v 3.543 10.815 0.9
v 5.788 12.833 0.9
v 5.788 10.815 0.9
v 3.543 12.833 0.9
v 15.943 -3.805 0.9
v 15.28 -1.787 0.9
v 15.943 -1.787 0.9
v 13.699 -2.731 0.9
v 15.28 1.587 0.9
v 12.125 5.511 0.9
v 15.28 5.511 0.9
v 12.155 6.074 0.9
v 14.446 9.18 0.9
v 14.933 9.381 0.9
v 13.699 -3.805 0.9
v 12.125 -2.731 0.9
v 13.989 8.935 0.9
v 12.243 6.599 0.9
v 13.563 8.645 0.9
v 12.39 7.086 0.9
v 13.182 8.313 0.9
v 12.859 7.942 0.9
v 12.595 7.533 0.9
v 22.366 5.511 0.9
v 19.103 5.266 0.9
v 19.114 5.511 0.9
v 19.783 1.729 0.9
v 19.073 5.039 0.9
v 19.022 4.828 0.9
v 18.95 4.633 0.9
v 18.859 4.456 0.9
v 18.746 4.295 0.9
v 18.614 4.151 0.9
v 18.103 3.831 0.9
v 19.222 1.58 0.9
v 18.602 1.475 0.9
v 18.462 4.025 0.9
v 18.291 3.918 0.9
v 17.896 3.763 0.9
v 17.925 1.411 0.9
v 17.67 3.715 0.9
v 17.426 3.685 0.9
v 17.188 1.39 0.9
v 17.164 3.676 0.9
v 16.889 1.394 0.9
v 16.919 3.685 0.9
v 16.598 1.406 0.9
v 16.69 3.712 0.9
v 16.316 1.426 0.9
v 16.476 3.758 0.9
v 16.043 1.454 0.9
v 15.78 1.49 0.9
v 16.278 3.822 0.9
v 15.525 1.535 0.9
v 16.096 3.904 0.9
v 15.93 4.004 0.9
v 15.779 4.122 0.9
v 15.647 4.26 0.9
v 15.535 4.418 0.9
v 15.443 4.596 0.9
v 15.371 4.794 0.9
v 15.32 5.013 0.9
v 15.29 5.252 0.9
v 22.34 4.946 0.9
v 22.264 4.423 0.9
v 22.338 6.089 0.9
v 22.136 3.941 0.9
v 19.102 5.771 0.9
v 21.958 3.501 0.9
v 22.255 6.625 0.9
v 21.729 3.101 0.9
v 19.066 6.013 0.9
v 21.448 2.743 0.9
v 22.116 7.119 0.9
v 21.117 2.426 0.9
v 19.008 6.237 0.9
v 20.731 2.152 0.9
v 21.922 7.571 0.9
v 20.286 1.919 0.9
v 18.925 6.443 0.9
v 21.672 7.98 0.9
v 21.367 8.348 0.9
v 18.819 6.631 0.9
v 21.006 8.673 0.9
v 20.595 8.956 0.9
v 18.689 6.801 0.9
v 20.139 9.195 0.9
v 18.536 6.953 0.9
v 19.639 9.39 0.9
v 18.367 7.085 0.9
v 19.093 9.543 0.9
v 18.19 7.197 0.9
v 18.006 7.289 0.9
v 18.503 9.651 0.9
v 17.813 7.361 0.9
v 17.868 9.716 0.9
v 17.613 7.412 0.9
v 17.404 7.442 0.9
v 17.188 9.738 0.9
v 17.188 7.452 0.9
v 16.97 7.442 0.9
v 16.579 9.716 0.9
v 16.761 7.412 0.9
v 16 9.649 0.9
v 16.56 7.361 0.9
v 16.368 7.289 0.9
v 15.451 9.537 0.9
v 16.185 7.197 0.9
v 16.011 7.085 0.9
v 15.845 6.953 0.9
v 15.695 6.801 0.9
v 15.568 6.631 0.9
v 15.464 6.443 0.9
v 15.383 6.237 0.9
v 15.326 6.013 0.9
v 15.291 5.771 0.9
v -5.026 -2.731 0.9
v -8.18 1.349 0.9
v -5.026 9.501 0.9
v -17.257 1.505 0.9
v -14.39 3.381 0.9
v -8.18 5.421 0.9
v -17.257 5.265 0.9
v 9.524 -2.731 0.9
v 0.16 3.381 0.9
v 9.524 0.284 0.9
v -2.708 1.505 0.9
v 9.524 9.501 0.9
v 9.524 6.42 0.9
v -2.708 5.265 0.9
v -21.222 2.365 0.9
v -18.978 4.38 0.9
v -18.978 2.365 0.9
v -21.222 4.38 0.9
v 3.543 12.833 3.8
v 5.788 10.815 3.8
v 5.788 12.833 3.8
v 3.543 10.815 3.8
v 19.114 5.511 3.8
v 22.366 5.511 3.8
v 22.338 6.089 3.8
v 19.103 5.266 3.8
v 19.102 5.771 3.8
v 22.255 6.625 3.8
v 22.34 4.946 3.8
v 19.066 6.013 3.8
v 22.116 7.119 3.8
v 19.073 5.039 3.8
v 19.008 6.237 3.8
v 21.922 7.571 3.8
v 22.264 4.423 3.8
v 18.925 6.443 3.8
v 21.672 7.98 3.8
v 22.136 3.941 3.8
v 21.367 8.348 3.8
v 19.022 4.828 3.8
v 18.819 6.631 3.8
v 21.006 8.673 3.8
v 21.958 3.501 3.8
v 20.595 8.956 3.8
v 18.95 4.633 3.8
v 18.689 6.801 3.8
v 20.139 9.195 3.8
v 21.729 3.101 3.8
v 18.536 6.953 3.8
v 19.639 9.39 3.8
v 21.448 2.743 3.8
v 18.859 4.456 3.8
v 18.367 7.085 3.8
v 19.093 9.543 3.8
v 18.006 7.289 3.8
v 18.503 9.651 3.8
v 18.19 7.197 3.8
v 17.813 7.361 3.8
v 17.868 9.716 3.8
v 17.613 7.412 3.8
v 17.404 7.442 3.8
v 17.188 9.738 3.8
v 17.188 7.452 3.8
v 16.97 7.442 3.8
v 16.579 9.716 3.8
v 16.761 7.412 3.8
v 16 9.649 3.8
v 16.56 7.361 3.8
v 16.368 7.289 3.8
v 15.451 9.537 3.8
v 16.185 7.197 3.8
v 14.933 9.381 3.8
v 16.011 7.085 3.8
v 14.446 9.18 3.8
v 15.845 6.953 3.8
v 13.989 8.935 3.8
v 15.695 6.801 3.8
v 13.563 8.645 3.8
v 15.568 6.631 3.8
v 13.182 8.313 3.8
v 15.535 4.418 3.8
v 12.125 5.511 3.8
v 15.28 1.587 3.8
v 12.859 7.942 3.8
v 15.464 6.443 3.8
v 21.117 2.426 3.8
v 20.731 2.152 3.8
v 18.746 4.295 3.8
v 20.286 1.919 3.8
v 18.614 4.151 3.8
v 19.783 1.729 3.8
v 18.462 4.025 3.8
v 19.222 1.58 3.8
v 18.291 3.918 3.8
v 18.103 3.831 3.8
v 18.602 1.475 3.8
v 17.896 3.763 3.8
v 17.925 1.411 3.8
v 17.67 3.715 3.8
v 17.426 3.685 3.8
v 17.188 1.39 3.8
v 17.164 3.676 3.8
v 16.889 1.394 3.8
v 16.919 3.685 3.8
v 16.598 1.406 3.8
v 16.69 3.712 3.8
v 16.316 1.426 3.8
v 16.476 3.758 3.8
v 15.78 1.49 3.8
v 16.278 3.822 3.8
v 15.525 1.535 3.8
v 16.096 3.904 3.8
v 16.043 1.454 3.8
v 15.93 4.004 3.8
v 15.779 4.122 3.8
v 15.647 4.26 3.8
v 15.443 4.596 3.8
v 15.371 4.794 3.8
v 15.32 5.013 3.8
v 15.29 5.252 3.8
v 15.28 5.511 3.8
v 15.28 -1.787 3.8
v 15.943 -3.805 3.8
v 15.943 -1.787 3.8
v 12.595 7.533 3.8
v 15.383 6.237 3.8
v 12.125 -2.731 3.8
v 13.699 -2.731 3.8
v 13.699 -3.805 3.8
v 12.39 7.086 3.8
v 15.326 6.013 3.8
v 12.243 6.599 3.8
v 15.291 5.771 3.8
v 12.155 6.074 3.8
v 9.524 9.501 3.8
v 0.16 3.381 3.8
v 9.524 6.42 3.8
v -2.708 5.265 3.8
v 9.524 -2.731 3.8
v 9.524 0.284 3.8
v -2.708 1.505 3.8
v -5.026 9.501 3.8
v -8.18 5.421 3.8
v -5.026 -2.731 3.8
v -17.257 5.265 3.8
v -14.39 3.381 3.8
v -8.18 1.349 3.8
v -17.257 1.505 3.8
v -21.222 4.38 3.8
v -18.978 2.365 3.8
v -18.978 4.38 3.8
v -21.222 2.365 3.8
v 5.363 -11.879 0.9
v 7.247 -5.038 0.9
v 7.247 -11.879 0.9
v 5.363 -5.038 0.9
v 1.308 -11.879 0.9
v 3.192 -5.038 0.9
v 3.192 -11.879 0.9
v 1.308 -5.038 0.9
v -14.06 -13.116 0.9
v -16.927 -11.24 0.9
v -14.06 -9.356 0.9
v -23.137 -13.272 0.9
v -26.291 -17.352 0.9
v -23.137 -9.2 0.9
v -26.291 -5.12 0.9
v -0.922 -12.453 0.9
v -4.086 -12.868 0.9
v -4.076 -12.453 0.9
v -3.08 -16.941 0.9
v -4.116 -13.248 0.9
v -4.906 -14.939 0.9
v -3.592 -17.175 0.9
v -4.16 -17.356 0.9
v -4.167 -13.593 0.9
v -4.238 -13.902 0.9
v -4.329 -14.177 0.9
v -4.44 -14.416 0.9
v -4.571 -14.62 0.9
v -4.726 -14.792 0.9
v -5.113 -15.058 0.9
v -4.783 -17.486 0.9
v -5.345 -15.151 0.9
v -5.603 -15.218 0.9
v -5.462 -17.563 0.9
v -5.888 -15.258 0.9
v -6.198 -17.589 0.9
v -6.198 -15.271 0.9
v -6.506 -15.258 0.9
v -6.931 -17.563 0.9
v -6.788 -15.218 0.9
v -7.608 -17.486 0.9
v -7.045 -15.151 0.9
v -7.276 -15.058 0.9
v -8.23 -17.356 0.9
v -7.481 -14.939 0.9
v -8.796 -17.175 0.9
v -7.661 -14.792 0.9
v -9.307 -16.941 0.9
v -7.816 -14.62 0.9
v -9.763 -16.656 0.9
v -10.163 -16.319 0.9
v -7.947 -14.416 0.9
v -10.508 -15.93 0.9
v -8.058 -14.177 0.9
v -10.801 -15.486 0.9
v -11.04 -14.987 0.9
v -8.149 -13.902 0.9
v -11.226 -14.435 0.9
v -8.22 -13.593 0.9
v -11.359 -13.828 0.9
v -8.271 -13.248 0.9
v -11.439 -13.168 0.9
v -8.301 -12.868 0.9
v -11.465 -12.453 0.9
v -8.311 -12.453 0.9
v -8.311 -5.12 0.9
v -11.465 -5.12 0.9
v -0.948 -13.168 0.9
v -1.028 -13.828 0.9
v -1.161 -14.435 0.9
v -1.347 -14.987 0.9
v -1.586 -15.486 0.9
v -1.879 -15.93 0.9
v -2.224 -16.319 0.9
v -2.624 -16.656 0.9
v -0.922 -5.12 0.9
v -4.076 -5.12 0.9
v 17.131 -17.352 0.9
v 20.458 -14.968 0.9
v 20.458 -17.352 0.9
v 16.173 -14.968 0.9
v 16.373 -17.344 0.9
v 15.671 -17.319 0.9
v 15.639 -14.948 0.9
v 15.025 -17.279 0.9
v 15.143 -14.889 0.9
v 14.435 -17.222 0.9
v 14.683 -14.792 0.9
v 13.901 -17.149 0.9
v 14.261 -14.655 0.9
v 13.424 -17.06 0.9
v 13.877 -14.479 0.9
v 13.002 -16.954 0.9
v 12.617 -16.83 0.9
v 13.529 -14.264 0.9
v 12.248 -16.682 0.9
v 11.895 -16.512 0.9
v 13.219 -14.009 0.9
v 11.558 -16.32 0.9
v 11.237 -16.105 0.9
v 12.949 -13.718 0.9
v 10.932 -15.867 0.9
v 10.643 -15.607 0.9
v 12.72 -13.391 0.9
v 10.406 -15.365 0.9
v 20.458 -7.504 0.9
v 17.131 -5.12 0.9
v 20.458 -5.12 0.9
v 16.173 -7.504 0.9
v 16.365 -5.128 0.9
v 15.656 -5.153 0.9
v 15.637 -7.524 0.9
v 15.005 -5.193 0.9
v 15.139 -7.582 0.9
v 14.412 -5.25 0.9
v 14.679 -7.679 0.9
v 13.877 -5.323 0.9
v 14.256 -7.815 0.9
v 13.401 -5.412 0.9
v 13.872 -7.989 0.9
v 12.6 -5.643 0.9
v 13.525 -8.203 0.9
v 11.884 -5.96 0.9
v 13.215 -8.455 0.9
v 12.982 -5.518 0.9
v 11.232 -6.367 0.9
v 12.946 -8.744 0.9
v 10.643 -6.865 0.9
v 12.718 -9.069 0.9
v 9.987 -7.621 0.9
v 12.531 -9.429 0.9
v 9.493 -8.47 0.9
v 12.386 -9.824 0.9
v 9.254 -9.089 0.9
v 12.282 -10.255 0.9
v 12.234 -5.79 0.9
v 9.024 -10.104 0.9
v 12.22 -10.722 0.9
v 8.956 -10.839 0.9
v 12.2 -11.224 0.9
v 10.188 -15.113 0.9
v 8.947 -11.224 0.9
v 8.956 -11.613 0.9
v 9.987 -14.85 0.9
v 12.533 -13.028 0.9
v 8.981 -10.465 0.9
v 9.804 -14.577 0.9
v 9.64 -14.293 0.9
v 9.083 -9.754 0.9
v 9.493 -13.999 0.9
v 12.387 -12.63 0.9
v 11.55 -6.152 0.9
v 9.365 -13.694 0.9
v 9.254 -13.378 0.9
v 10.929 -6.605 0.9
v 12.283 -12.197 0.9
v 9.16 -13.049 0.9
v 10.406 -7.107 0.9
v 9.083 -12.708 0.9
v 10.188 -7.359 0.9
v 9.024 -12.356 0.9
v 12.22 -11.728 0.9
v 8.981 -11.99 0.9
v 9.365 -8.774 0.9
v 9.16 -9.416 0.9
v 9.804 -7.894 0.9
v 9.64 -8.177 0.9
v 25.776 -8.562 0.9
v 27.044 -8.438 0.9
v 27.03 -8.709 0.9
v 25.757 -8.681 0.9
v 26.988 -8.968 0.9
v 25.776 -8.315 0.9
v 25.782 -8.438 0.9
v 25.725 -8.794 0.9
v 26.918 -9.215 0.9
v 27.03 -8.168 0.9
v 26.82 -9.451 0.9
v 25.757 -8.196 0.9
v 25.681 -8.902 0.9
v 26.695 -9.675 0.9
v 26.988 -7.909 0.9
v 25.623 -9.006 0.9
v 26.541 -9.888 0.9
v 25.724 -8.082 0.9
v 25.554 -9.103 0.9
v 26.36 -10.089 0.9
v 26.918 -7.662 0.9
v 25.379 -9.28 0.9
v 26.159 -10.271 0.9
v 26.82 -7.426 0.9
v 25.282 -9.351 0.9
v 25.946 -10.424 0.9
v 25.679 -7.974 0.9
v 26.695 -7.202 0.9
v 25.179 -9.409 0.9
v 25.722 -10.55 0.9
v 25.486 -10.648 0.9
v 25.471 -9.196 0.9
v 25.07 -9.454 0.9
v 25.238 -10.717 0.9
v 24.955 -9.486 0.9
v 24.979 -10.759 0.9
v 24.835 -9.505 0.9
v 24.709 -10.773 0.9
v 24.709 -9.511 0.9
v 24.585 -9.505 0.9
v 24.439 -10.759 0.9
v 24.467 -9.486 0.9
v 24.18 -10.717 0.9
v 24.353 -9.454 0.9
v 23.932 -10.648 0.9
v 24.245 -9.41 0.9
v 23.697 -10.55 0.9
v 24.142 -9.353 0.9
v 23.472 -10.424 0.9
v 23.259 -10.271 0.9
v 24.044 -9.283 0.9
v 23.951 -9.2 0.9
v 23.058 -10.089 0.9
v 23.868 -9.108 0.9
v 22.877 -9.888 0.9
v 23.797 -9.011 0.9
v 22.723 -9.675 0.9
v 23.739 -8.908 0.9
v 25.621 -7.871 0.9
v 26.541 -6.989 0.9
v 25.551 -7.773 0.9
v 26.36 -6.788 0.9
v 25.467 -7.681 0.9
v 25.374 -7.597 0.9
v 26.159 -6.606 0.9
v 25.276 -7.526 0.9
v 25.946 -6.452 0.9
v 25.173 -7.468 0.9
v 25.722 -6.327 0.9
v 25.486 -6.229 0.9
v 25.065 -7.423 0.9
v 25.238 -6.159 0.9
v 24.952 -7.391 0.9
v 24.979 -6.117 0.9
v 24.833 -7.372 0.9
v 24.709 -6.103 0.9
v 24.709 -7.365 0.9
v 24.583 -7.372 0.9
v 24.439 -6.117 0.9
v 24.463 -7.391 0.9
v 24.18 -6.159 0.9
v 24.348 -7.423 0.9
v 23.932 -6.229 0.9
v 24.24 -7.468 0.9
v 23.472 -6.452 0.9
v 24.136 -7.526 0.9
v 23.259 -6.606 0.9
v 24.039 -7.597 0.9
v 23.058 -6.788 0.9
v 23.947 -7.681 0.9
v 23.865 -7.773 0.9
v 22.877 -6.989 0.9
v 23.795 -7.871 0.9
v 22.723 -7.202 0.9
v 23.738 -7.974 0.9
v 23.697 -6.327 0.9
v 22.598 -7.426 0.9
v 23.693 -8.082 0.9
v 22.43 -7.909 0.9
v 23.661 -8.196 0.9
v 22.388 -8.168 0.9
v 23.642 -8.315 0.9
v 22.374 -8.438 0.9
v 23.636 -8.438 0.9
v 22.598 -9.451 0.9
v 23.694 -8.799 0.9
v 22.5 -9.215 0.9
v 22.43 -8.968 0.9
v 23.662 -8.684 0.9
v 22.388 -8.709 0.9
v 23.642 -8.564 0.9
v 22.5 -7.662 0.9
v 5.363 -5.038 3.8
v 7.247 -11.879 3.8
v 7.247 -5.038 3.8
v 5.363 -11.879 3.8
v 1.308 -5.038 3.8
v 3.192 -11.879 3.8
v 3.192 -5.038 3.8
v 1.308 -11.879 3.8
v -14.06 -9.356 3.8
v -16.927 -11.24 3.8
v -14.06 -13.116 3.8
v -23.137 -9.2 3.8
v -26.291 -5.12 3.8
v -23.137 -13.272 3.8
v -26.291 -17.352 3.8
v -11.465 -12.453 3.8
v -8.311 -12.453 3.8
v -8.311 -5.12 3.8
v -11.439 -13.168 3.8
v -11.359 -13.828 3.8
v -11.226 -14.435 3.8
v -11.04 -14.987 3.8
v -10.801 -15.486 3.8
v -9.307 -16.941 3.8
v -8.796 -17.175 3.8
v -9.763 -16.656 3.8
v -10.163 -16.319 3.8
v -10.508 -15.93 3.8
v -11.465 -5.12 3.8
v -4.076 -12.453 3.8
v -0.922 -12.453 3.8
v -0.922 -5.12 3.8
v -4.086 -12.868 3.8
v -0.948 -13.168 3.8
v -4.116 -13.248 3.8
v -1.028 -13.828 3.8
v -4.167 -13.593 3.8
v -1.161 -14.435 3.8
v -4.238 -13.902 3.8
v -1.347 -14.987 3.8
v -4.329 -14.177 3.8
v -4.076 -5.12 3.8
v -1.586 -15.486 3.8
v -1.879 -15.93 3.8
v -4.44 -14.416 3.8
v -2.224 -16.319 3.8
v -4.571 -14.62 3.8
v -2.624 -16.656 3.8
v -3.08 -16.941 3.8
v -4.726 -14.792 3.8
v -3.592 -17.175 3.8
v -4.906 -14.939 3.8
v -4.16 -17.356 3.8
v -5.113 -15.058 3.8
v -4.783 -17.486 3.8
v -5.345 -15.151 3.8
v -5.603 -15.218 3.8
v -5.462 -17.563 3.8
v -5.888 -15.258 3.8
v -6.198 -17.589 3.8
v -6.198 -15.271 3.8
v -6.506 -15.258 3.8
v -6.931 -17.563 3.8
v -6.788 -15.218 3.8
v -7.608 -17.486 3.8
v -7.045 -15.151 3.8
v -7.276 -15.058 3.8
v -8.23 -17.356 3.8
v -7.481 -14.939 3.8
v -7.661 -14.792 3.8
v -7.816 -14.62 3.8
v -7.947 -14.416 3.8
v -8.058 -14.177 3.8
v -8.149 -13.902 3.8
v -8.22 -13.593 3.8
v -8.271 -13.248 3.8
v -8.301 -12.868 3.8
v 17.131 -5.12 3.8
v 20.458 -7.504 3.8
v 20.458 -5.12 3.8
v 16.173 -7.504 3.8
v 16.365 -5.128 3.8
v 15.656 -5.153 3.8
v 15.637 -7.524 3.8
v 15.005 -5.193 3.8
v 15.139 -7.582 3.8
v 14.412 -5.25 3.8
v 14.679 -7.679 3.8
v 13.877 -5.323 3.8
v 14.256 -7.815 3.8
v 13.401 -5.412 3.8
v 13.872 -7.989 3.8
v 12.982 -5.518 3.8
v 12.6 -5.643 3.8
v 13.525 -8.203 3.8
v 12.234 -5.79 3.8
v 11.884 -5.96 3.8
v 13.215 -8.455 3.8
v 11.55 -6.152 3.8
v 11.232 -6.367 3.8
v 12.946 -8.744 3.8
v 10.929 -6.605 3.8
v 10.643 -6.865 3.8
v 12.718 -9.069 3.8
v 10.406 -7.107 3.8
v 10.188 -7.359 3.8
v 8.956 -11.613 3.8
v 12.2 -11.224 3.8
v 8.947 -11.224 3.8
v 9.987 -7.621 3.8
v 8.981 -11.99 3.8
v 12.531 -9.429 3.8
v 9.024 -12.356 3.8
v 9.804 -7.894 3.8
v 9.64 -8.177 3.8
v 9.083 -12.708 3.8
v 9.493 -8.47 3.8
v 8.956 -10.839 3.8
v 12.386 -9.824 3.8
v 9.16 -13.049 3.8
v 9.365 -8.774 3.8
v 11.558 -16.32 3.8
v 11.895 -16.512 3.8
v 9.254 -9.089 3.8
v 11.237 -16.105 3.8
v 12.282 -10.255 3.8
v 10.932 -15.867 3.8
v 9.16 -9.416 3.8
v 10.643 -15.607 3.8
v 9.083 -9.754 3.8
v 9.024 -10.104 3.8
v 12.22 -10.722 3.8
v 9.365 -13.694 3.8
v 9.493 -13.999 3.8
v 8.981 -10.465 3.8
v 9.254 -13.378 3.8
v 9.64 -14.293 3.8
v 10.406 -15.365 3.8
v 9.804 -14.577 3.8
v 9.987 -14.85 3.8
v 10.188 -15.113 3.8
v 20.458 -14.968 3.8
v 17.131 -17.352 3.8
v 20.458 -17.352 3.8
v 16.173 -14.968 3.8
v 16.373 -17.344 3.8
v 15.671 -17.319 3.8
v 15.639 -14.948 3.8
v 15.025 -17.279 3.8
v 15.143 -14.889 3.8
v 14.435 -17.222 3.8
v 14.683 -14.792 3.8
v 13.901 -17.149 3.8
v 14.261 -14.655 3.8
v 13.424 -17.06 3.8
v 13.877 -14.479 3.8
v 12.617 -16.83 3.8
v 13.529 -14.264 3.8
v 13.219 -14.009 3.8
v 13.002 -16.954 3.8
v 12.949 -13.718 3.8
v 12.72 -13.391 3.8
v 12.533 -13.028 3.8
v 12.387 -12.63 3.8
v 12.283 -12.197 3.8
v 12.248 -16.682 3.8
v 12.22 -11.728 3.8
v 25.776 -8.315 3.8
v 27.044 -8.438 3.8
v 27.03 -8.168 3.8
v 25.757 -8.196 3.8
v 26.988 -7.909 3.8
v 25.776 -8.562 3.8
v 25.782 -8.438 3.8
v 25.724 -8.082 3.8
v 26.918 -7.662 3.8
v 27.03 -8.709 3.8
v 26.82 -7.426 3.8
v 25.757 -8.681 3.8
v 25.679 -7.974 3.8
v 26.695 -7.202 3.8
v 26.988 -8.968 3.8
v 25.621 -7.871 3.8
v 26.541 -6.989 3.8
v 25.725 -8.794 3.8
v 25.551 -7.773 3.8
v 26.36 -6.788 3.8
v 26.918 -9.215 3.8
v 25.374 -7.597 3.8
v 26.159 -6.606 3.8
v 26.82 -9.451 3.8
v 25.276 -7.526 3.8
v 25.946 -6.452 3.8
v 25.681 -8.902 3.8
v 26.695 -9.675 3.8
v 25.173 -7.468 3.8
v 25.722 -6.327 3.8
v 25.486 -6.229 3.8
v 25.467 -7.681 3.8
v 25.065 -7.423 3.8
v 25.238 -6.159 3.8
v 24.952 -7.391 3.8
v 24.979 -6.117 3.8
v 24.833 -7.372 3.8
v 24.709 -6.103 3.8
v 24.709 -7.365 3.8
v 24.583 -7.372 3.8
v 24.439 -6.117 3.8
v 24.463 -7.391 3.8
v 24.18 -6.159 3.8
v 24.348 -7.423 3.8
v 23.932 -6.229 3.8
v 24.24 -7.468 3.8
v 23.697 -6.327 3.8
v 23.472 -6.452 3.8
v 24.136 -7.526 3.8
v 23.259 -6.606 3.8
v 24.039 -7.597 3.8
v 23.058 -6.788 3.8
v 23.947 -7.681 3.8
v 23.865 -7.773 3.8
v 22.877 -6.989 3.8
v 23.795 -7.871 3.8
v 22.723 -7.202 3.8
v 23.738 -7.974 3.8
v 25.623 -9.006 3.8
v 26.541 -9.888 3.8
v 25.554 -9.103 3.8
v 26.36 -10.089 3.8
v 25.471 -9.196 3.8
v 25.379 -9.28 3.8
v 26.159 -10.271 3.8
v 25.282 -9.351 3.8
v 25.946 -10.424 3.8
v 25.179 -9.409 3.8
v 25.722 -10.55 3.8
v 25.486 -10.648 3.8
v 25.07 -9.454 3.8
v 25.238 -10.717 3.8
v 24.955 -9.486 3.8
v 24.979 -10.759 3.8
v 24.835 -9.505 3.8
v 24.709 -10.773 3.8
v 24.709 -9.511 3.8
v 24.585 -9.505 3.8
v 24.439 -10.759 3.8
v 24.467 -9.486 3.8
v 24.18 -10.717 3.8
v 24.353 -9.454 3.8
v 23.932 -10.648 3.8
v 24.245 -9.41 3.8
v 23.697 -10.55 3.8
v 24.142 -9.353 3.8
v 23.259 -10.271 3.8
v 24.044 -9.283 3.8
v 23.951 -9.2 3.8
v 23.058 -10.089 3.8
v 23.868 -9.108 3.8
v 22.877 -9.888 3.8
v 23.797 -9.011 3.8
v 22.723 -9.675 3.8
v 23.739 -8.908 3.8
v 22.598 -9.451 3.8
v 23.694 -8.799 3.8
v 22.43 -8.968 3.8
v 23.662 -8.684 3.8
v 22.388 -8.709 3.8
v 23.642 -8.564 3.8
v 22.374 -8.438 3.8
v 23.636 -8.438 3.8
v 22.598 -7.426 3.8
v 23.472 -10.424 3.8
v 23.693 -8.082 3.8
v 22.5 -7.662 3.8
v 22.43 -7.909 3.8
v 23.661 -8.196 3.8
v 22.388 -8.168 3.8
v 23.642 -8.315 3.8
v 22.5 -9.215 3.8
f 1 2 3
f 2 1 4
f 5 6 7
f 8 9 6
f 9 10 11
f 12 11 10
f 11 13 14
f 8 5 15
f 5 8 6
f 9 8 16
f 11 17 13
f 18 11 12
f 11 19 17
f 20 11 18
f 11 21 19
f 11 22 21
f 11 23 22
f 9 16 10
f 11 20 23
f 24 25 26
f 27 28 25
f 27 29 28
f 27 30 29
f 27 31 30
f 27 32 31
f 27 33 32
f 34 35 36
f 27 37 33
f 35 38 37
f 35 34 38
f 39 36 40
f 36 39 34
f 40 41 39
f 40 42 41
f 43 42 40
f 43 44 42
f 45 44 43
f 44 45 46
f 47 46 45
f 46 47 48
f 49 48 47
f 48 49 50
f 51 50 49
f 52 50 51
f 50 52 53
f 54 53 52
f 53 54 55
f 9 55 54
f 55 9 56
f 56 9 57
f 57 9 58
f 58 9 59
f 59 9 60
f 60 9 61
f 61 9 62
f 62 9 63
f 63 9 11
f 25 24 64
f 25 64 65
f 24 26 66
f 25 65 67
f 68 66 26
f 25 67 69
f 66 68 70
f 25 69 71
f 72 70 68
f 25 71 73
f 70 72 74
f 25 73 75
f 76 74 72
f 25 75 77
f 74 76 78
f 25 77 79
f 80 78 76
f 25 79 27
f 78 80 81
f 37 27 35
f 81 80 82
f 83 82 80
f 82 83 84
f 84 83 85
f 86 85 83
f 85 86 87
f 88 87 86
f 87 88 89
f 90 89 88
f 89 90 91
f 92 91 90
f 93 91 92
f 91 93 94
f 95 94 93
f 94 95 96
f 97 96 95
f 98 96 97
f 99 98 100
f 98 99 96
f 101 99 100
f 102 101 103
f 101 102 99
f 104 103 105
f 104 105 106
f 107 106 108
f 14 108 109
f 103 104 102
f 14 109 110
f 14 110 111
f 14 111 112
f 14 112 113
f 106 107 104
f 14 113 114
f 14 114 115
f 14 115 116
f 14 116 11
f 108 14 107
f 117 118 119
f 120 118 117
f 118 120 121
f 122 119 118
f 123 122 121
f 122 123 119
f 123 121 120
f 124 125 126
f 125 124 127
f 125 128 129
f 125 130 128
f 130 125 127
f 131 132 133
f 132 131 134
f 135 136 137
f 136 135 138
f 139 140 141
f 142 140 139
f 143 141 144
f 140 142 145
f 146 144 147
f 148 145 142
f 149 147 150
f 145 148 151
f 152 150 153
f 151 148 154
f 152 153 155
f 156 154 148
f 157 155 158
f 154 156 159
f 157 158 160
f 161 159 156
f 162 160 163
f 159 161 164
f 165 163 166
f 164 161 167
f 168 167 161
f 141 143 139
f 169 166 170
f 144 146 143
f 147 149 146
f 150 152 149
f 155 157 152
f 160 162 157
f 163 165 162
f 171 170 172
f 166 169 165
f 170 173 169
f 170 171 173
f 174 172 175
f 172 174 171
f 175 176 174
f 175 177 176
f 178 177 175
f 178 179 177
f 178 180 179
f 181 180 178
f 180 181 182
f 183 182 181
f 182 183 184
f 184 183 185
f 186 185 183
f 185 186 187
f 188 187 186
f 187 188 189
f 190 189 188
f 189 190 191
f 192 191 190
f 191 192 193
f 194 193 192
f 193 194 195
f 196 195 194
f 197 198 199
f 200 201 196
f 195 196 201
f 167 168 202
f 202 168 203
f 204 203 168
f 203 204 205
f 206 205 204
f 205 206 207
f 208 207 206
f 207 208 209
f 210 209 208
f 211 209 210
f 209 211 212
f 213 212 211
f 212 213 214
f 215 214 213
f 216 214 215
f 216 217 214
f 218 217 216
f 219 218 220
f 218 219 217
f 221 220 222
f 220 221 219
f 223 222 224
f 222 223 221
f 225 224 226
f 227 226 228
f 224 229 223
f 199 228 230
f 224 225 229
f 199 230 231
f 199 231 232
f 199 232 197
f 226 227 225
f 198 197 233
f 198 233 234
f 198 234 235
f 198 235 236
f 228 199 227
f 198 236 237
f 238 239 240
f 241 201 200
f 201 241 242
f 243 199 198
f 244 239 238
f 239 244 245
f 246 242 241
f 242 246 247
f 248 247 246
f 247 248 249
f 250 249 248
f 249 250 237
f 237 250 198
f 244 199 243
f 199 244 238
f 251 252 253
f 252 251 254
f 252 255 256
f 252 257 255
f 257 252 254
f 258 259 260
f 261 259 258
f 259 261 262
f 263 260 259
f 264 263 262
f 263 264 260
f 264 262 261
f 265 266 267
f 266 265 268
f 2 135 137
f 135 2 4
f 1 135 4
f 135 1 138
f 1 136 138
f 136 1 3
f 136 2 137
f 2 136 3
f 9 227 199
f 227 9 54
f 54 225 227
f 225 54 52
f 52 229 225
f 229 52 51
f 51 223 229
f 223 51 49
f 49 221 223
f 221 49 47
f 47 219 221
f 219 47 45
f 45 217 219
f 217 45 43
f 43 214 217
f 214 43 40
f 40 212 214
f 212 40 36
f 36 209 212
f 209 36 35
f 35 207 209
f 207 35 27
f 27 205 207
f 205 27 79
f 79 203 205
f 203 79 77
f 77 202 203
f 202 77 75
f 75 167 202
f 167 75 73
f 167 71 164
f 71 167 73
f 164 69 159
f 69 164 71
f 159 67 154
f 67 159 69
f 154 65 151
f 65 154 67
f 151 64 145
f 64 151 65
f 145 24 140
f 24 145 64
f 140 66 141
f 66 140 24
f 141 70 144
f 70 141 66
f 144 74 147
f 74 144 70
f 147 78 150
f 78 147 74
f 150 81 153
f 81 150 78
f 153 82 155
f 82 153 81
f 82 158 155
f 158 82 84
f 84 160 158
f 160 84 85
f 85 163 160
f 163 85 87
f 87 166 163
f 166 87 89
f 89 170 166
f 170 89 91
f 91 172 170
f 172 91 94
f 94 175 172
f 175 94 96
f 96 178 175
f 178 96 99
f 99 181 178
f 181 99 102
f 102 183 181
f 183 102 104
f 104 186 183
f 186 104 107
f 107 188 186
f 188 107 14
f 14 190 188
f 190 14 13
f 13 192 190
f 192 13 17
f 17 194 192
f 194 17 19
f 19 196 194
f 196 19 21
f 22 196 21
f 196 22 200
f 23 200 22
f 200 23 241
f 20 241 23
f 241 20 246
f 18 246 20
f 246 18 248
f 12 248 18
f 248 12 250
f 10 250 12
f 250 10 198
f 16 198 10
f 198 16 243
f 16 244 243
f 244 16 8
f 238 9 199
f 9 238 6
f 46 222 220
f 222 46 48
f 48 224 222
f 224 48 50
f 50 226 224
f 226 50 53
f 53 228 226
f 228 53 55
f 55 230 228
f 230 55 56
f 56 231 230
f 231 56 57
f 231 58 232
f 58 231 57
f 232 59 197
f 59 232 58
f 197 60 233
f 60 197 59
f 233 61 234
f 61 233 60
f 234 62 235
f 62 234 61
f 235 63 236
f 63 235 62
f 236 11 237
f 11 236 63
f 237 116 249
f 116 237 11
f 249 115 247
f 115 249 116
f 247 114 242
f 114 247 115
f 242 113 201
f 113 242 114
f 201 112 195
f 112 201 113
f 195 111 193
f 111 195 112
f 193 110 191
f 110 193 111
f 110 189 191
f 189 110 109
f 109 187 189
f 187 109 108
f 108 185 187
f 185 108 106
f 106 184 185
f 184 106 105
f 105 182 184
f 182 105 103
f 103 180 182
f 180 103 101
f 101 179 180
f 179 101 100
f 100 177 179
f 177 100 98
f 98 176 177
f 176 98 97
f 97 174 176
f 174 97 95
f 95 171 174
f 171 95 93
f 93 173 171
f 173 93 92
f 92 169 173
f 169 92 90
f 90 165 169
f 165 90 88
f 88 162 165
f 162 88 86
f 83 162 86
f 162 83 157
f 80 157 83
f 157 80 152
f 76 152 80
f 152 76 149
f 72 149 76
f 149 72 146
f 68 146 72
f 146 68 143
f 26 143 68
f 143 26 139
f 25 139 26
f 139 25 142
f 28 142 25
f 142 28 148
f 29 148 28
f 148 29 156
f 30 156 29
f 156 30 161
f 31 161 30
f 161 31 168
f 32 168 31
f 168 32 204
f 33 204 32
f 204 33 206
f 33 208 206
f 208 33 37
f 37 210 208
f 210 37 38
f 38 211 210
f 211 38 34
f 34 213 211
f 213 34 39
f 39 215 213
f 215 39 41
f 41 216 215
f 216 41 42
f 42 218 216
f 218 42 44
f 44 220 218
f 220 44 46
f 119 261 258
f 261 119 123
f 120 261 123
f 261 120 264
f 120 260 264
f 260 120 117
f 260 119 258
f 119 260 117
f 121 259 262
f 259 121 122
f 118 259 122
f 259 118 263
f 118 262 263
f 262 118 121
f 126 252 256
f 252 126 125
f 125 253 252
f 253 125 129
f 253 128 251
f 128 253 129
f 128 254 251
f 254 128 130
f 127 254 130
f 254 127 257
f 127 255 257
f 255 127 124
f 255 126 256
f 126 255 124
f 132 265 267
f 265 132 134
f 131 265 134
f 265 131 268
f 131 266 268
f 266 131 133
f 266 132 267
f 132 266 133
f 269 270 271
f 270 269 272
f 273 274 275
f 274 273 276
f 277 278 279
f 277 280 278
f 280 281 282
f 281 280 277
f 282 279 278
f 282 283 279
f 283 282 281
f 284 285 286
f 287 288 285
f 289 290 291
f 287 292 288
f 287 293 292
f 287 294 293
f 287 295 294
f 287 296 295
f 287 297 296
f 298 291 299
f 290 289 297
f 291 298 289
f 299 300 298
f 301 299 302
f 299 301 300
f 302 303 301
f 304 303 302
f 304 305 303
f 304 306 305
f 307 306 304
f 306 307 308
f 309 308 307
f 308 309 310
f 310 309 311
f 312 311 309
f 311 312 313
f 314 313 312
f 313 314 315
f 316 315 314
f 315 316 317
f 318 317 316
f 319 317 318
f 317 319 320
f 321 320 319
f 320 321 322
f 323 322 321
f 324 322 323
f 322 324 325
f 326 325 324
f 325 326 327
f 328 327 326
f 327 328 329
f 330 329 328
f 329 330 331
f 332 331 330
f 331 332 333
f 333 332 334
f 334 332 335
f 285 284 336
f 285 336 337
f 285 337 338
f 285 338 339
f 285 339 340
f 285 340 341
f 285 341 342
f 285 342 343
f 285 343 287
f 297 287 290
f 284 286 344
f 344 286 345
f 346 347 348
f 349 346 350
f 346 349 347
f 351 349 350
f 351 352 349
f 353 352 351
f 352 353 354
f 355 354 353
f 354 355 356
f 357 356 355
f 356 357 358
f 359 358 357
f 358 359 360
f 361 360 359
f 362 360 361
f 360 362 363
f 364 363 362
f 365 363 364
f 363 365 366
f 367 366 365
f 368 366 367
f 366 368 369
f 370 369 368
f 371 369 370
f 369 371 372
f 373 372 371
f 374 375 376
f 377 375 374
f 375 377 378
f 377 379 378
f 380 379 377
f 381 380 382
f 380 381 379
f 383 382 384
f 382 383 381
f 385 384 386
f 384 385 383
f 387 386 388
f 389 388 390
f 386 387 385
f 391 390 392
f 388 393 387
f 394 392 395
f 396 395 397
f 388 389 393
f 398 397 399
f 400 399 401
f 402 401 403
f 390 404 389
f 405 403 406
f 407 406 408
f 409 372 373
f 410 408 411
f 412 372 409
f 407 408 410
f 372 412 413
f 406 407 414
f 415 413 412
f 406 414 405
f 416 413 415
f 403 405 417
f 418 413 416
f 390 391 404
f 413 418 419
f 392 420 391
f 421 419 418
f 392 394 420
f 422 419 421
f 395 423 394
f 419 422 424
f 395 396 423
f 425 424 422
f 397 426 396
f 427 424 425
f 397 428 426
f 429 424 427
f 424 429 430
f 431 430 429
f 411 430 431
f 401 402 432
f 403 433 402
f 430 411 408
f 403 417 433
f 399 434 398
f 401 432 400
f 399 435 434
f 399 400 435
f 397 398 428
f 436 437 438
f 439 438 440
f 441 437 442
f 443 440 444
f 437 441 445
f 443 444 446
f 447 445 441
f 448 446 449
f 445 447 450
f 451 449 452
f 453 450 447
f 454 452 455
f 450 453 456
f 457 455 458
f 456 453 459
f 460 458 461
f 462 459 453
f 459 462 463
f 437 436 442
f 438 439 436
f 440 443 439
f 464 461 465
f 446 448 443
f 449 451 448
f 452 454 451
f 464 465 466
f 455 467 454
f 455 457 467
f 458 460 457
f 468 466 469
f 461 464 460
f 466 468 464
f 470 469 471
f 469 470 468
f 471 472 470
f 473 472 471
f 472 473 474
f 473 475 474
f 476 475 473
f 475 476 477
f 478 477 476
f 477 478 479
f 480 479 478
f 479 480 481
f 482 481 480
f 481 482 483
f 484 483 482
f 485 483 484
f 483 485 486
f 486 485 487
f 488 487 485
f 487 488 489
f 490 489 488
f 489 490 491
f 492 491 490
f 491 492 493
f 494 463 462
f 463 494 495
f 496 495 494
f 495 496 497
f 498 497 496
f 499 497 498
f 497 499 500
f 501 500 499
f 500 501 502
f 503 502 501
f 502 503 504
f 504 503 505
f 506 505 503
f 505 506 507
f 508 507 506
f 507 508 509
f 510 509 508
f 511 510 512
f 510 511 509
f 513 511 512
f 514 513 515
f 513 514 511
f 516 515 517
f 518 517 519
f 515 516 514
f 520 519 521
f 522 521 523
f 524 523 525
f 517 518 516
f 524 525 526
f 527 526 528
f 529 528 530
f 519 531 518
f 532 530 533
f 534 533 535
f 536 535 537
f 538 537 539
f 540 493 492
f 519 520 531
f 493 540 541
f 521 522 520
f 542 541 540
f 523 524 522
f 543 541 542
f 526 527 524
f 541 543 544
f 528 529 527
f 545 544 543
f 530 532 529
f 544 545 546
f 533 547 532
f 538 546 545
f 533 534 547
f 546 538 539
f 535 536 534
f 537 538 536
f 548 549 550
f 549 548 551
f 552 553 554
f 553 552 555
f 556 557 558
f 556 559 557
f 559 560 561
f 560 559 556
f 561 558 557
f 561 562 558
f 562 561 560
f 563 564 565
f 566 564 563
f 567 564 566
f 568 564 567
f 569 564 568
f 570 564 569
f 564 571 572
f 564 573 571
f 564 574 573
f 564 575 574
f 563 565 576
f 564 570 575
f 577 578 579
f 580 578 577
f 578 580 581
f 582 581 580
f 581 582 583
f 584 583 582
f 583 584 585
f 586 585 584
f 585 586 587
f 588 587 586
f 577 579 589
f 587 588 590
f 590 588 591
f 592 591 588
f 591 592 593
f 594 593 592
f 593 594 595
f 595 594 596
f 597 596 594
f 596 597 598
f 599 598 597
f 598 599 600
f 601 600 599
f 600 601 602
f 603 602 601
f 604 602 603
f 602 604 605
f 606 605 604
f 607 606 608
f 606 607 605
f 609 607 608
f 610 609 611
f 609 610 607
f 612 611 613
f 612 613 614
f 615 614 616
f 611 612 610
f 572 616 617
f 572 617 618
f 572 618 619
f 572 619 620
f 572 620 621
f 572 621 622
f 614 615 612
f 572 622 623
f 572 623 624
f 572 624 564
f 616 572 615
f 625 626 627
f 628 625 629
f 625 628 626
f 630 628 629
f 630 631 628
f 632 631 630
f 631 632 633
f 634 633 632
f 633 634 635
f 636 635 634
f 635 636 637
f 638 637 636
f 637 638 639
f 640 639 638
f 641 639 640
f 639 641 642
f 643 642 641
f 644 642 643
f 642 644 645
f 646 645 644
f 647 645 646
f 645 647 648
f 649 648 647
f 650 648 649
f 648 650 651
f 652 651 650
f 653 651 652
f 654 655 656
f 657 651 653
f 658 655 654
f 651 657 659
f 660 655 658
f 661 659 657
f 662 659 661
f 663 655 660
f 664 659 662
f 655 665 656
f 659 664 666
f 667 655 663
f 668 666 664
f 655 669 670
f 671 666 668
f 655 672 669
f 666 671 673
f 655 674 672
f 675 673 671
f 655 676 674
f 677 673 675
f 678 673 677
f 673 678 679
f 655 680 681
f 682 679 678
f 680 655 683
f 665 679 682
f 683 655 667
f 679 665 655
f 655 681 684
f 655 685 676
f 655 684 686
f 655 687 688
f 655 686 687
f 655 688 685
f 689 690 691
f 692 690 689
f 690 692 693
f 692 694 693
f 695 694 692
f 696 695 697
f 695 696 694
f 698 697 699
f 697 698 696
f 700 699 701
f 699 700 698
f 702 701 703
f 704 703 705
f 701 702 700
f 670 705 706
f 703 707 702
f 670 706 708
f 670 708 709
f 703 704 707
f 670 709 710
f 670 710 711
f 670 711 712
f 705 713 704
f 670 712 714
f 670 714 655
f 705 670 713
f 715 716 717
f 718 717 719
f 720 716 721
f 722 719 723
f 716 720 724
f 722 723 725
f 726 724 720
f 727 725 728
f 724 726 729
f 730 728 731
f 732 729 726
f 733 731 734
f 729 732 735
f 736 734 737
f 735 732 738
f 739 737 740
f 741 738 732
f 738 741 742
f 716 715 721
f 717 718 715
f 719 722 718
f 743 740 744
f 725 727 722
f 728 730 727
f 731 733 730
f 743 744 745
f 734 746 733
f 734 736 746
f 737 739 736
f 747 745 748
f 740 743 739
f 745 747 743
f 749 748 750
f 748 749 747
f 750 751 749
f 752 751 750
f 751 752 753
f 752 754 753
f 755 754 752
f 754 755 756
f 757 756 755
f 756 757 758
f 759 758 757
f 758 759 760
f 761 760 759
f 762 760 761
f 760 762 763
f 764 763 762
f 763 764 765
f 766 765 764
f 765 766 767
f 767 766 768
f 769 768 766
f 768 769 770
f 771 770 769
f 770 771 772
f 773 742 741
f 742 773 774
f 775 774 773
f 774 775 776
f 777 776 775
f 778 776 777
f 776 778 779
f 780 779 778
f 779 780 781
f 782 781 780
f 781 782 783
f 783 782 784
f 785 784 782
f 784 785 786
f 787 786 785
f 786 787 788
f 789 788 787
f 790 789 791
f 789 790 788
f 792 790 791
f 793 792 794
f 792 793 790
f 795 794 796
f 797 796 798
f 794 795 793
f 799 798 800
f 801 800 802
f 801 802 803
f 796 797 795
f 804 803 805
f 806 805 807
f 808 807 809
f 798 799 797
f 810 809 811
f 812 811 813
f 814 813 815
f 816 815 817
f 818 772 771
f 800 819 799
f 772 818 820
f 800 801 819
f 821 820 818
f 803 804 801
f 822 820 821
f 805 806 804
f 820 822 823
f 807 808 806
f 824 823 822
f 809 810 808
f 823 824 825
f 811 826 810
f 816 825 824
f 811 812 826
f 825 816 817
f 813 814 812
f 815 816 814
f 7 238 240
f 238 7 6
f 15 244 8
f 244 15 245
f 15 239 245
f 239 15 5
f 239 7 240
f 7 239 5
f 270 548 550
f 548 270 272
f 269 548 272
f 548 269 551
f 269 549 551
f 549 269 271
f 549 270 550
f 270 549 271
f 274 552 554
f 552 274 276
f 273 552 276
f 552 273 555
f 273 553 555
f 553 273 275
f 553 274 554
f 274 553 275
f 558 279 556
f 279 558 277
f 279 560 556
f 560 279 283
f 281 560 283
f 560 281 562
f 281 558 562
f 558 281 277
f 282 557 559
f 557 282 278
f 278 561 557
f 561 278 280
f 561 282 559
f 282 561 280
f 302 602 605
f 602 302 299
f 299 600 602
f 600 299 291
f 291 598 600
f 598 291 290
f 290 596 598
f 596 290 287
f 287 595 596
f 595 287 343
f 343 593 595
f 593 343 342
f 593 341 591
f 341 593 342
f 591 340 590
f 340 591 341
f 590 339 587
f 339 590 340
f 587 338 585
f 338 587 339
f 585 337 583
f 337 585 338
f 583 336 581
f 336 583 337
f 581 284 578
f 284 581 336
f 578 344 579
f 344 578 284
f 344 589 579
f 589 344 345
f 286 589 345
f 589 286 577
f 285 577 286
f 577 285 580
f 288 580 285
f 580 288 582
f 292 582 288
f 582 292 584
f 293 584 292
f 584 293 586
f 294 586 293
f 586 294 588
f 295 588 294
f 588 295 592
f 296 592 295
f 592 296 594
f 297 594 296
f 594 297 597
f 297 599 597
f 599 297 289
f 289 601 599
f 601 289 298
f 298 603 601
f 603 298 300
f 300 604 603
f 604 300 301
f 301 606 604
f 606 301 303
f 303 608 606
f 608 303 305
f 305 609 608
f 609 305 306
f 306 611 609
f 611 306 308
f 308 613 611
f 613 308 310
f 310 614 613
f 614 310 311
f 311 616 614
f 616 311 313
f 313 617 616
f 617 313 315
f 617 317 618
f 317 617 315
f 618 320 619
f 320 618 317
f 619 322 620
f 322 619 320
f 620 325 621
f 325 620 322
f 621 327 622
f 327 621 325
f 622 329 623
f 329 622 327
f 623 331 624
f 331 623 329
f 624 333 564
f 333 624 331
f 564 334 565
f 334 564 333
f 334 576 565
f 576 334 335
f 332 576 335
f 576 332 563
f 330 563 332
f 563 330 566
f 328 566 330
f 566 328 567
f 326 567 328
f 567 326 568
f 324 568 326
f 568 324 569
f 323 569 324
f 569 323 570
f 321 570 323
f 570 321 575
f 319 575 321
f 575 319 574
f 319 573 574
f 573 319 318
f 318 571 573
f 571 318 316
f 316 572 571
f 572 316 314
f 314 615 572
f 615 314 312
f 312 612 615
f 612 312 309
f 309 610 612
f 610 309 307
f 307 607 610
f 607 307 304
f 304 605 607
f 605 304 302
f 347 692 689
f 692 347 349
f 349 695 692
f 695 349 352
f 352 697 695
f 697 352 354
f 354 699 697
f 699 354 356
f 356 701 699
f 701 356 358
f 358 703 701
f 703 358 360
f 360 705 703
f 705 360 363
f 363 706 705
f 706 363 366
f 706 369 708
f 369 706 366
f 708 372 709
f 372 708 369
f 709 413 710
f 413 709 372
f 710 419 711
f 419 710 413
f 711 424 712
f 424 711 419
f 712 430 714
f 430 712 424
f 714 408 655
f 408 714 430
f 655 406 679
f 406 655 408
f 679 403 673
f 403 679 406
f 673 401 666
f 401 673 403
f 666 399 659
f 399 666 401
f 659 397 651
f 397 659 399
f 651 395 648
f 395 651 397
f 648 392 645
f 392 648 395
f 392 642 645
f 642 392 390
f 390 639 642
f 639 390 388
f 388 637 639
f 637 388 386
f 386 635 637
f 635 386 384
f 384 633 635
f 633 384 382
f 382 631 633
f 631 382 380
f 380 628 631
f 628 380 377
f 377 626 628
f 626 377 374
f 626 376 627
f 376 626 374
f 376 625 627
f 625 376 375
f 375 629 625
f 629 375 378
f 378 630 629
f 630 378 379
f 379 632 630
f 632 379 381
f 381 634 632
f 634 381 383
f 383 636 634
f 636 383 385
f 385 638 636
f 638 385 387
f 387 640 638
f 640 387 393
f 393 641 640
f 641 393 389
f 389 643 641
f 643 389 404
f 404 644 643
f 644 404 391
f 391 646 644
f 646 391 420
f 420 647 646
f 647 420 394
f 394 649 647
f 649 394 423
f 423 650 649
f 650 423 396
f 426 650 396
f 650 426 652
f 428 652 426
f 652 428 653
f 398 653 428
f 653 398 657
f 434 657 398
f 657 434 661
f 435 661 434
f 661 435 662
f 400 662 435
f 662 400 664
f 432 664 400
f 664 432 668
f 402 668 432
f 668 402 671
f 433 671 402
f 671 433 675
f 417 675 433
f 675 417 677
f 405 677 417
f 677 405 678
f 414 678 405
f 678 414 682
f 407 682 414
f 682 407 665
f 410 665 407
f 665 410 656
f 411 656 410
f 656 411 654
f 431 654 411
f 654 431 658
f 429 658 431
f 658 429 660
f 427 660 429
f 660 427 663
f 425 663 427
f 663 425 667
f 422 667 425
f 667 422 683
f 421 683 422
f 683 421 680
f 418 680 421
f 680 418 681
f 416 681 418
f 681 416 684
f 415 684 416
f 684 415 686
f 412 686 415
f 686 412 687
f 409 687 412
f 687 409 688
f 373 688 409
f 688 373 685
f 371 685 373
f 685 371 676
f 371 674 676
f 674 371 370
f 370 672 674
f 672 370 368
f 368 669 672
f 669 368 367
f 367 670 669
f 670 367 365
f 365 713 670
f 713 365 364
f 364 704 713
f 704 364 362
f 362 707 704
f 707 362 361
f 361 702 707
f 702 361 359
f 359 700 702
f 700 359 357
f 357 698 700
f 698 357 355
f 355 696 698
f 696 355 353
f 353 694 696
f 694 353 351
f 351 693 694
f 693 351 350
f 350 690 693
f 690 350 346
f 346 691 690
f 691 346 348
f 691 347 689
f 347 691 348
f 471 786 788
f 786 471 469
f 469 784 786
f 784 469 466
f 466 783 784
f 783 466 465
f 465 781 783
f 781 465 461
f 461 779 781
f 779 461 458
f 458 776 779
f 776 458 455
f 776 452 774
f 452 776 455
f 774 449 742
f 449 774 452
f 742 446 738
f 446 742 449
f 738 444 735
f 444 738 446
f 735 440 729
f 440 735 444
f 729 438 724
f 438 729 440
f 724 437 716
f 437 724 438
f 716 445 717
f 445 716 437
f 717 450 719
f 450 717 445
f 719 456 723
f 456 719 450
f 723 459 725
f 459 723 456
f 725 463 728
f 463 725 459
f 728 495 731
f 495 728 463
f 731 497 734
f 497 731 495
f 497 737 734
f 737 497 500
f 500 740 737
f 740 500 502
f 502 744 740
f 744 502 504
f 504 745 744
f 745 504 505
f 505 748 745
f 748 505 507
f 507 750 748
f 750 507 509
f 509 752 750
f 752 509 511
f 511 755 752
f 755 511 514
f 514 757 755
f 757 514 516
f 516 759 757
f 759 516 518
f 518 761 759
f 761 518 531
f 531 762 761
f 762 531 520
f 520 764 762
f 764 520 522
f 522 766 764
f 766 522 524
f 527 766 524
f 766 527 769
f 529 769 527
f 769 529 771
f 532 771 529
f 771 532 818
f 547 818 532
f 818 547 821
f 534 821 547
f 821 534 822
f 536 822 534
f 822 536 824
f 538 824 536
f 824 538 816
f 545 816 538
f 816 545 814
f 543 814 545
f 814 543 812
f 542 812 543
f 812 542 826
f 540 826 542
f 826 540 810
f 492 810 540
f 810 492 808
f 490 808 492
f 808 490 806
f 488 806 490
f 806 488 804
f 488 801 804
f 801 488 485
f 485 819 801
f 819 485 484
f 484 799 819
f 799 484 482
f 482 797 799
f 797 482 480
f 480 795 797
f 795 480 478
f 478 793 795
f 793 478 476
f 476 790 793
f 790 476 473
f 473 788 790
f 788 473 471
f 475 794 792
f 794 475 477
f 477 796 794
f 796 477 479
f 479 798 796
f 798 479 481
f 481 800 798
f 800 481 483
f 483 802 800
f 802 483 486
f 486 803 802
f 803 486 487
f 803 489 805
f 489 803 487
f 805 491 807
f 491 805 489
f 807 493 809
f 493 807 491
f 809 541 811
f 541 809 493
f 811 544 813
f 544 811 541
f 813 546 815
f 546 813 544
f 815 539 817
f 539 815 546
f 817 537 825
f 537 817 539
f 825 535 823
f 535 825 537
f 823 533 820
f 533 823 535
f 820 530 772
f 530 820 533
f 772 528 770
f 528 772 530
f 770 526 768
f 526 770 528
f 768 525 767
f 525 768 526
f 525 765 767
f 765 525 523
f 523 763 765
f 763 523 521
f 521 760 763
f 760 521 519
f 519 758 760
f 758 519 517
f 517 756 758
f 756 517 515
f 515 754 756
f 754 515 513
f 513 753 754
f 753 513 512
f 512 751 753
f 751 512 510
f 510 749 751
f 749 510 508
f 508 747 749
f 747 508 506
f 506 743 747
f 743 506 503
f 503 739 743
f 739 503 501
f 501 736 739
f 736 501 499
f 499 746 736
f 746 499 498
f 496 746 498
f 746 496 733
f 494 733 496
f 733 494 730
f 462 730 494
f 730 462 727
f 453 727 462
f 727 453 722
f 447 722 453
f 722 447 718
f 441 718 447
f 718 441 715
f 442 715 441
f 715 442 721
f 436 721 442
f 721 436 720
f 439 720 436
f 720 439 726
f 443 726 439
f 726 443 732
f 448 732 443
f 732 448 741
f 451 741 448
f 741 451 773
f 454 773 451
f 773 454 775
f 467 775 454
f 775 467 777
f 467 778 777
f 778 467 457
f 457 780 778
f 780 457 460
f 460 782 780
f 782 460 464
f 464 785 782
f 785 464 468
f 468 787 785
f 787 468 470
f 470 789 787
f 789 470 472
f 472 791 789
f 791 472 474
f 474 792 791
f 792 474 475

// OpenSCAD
$fn = 48;
  // syllabics (overlaid on icon, tallest)
  translate([0, 4.869, 0.900]) linear_extrude(height=2.900) text("ᐗᐹᑭ", size=12.081, halign="center", valign="center", font="Euphemia UCAS:style=Bold");
  translate([0, -9.869, 0.900]) linear_extrude(height=2.900) text("ᐅᑌᐦᑖᐤ", size=12.081, halign="center", valign="center", font="Euphemia UCAS:style=Bold");
